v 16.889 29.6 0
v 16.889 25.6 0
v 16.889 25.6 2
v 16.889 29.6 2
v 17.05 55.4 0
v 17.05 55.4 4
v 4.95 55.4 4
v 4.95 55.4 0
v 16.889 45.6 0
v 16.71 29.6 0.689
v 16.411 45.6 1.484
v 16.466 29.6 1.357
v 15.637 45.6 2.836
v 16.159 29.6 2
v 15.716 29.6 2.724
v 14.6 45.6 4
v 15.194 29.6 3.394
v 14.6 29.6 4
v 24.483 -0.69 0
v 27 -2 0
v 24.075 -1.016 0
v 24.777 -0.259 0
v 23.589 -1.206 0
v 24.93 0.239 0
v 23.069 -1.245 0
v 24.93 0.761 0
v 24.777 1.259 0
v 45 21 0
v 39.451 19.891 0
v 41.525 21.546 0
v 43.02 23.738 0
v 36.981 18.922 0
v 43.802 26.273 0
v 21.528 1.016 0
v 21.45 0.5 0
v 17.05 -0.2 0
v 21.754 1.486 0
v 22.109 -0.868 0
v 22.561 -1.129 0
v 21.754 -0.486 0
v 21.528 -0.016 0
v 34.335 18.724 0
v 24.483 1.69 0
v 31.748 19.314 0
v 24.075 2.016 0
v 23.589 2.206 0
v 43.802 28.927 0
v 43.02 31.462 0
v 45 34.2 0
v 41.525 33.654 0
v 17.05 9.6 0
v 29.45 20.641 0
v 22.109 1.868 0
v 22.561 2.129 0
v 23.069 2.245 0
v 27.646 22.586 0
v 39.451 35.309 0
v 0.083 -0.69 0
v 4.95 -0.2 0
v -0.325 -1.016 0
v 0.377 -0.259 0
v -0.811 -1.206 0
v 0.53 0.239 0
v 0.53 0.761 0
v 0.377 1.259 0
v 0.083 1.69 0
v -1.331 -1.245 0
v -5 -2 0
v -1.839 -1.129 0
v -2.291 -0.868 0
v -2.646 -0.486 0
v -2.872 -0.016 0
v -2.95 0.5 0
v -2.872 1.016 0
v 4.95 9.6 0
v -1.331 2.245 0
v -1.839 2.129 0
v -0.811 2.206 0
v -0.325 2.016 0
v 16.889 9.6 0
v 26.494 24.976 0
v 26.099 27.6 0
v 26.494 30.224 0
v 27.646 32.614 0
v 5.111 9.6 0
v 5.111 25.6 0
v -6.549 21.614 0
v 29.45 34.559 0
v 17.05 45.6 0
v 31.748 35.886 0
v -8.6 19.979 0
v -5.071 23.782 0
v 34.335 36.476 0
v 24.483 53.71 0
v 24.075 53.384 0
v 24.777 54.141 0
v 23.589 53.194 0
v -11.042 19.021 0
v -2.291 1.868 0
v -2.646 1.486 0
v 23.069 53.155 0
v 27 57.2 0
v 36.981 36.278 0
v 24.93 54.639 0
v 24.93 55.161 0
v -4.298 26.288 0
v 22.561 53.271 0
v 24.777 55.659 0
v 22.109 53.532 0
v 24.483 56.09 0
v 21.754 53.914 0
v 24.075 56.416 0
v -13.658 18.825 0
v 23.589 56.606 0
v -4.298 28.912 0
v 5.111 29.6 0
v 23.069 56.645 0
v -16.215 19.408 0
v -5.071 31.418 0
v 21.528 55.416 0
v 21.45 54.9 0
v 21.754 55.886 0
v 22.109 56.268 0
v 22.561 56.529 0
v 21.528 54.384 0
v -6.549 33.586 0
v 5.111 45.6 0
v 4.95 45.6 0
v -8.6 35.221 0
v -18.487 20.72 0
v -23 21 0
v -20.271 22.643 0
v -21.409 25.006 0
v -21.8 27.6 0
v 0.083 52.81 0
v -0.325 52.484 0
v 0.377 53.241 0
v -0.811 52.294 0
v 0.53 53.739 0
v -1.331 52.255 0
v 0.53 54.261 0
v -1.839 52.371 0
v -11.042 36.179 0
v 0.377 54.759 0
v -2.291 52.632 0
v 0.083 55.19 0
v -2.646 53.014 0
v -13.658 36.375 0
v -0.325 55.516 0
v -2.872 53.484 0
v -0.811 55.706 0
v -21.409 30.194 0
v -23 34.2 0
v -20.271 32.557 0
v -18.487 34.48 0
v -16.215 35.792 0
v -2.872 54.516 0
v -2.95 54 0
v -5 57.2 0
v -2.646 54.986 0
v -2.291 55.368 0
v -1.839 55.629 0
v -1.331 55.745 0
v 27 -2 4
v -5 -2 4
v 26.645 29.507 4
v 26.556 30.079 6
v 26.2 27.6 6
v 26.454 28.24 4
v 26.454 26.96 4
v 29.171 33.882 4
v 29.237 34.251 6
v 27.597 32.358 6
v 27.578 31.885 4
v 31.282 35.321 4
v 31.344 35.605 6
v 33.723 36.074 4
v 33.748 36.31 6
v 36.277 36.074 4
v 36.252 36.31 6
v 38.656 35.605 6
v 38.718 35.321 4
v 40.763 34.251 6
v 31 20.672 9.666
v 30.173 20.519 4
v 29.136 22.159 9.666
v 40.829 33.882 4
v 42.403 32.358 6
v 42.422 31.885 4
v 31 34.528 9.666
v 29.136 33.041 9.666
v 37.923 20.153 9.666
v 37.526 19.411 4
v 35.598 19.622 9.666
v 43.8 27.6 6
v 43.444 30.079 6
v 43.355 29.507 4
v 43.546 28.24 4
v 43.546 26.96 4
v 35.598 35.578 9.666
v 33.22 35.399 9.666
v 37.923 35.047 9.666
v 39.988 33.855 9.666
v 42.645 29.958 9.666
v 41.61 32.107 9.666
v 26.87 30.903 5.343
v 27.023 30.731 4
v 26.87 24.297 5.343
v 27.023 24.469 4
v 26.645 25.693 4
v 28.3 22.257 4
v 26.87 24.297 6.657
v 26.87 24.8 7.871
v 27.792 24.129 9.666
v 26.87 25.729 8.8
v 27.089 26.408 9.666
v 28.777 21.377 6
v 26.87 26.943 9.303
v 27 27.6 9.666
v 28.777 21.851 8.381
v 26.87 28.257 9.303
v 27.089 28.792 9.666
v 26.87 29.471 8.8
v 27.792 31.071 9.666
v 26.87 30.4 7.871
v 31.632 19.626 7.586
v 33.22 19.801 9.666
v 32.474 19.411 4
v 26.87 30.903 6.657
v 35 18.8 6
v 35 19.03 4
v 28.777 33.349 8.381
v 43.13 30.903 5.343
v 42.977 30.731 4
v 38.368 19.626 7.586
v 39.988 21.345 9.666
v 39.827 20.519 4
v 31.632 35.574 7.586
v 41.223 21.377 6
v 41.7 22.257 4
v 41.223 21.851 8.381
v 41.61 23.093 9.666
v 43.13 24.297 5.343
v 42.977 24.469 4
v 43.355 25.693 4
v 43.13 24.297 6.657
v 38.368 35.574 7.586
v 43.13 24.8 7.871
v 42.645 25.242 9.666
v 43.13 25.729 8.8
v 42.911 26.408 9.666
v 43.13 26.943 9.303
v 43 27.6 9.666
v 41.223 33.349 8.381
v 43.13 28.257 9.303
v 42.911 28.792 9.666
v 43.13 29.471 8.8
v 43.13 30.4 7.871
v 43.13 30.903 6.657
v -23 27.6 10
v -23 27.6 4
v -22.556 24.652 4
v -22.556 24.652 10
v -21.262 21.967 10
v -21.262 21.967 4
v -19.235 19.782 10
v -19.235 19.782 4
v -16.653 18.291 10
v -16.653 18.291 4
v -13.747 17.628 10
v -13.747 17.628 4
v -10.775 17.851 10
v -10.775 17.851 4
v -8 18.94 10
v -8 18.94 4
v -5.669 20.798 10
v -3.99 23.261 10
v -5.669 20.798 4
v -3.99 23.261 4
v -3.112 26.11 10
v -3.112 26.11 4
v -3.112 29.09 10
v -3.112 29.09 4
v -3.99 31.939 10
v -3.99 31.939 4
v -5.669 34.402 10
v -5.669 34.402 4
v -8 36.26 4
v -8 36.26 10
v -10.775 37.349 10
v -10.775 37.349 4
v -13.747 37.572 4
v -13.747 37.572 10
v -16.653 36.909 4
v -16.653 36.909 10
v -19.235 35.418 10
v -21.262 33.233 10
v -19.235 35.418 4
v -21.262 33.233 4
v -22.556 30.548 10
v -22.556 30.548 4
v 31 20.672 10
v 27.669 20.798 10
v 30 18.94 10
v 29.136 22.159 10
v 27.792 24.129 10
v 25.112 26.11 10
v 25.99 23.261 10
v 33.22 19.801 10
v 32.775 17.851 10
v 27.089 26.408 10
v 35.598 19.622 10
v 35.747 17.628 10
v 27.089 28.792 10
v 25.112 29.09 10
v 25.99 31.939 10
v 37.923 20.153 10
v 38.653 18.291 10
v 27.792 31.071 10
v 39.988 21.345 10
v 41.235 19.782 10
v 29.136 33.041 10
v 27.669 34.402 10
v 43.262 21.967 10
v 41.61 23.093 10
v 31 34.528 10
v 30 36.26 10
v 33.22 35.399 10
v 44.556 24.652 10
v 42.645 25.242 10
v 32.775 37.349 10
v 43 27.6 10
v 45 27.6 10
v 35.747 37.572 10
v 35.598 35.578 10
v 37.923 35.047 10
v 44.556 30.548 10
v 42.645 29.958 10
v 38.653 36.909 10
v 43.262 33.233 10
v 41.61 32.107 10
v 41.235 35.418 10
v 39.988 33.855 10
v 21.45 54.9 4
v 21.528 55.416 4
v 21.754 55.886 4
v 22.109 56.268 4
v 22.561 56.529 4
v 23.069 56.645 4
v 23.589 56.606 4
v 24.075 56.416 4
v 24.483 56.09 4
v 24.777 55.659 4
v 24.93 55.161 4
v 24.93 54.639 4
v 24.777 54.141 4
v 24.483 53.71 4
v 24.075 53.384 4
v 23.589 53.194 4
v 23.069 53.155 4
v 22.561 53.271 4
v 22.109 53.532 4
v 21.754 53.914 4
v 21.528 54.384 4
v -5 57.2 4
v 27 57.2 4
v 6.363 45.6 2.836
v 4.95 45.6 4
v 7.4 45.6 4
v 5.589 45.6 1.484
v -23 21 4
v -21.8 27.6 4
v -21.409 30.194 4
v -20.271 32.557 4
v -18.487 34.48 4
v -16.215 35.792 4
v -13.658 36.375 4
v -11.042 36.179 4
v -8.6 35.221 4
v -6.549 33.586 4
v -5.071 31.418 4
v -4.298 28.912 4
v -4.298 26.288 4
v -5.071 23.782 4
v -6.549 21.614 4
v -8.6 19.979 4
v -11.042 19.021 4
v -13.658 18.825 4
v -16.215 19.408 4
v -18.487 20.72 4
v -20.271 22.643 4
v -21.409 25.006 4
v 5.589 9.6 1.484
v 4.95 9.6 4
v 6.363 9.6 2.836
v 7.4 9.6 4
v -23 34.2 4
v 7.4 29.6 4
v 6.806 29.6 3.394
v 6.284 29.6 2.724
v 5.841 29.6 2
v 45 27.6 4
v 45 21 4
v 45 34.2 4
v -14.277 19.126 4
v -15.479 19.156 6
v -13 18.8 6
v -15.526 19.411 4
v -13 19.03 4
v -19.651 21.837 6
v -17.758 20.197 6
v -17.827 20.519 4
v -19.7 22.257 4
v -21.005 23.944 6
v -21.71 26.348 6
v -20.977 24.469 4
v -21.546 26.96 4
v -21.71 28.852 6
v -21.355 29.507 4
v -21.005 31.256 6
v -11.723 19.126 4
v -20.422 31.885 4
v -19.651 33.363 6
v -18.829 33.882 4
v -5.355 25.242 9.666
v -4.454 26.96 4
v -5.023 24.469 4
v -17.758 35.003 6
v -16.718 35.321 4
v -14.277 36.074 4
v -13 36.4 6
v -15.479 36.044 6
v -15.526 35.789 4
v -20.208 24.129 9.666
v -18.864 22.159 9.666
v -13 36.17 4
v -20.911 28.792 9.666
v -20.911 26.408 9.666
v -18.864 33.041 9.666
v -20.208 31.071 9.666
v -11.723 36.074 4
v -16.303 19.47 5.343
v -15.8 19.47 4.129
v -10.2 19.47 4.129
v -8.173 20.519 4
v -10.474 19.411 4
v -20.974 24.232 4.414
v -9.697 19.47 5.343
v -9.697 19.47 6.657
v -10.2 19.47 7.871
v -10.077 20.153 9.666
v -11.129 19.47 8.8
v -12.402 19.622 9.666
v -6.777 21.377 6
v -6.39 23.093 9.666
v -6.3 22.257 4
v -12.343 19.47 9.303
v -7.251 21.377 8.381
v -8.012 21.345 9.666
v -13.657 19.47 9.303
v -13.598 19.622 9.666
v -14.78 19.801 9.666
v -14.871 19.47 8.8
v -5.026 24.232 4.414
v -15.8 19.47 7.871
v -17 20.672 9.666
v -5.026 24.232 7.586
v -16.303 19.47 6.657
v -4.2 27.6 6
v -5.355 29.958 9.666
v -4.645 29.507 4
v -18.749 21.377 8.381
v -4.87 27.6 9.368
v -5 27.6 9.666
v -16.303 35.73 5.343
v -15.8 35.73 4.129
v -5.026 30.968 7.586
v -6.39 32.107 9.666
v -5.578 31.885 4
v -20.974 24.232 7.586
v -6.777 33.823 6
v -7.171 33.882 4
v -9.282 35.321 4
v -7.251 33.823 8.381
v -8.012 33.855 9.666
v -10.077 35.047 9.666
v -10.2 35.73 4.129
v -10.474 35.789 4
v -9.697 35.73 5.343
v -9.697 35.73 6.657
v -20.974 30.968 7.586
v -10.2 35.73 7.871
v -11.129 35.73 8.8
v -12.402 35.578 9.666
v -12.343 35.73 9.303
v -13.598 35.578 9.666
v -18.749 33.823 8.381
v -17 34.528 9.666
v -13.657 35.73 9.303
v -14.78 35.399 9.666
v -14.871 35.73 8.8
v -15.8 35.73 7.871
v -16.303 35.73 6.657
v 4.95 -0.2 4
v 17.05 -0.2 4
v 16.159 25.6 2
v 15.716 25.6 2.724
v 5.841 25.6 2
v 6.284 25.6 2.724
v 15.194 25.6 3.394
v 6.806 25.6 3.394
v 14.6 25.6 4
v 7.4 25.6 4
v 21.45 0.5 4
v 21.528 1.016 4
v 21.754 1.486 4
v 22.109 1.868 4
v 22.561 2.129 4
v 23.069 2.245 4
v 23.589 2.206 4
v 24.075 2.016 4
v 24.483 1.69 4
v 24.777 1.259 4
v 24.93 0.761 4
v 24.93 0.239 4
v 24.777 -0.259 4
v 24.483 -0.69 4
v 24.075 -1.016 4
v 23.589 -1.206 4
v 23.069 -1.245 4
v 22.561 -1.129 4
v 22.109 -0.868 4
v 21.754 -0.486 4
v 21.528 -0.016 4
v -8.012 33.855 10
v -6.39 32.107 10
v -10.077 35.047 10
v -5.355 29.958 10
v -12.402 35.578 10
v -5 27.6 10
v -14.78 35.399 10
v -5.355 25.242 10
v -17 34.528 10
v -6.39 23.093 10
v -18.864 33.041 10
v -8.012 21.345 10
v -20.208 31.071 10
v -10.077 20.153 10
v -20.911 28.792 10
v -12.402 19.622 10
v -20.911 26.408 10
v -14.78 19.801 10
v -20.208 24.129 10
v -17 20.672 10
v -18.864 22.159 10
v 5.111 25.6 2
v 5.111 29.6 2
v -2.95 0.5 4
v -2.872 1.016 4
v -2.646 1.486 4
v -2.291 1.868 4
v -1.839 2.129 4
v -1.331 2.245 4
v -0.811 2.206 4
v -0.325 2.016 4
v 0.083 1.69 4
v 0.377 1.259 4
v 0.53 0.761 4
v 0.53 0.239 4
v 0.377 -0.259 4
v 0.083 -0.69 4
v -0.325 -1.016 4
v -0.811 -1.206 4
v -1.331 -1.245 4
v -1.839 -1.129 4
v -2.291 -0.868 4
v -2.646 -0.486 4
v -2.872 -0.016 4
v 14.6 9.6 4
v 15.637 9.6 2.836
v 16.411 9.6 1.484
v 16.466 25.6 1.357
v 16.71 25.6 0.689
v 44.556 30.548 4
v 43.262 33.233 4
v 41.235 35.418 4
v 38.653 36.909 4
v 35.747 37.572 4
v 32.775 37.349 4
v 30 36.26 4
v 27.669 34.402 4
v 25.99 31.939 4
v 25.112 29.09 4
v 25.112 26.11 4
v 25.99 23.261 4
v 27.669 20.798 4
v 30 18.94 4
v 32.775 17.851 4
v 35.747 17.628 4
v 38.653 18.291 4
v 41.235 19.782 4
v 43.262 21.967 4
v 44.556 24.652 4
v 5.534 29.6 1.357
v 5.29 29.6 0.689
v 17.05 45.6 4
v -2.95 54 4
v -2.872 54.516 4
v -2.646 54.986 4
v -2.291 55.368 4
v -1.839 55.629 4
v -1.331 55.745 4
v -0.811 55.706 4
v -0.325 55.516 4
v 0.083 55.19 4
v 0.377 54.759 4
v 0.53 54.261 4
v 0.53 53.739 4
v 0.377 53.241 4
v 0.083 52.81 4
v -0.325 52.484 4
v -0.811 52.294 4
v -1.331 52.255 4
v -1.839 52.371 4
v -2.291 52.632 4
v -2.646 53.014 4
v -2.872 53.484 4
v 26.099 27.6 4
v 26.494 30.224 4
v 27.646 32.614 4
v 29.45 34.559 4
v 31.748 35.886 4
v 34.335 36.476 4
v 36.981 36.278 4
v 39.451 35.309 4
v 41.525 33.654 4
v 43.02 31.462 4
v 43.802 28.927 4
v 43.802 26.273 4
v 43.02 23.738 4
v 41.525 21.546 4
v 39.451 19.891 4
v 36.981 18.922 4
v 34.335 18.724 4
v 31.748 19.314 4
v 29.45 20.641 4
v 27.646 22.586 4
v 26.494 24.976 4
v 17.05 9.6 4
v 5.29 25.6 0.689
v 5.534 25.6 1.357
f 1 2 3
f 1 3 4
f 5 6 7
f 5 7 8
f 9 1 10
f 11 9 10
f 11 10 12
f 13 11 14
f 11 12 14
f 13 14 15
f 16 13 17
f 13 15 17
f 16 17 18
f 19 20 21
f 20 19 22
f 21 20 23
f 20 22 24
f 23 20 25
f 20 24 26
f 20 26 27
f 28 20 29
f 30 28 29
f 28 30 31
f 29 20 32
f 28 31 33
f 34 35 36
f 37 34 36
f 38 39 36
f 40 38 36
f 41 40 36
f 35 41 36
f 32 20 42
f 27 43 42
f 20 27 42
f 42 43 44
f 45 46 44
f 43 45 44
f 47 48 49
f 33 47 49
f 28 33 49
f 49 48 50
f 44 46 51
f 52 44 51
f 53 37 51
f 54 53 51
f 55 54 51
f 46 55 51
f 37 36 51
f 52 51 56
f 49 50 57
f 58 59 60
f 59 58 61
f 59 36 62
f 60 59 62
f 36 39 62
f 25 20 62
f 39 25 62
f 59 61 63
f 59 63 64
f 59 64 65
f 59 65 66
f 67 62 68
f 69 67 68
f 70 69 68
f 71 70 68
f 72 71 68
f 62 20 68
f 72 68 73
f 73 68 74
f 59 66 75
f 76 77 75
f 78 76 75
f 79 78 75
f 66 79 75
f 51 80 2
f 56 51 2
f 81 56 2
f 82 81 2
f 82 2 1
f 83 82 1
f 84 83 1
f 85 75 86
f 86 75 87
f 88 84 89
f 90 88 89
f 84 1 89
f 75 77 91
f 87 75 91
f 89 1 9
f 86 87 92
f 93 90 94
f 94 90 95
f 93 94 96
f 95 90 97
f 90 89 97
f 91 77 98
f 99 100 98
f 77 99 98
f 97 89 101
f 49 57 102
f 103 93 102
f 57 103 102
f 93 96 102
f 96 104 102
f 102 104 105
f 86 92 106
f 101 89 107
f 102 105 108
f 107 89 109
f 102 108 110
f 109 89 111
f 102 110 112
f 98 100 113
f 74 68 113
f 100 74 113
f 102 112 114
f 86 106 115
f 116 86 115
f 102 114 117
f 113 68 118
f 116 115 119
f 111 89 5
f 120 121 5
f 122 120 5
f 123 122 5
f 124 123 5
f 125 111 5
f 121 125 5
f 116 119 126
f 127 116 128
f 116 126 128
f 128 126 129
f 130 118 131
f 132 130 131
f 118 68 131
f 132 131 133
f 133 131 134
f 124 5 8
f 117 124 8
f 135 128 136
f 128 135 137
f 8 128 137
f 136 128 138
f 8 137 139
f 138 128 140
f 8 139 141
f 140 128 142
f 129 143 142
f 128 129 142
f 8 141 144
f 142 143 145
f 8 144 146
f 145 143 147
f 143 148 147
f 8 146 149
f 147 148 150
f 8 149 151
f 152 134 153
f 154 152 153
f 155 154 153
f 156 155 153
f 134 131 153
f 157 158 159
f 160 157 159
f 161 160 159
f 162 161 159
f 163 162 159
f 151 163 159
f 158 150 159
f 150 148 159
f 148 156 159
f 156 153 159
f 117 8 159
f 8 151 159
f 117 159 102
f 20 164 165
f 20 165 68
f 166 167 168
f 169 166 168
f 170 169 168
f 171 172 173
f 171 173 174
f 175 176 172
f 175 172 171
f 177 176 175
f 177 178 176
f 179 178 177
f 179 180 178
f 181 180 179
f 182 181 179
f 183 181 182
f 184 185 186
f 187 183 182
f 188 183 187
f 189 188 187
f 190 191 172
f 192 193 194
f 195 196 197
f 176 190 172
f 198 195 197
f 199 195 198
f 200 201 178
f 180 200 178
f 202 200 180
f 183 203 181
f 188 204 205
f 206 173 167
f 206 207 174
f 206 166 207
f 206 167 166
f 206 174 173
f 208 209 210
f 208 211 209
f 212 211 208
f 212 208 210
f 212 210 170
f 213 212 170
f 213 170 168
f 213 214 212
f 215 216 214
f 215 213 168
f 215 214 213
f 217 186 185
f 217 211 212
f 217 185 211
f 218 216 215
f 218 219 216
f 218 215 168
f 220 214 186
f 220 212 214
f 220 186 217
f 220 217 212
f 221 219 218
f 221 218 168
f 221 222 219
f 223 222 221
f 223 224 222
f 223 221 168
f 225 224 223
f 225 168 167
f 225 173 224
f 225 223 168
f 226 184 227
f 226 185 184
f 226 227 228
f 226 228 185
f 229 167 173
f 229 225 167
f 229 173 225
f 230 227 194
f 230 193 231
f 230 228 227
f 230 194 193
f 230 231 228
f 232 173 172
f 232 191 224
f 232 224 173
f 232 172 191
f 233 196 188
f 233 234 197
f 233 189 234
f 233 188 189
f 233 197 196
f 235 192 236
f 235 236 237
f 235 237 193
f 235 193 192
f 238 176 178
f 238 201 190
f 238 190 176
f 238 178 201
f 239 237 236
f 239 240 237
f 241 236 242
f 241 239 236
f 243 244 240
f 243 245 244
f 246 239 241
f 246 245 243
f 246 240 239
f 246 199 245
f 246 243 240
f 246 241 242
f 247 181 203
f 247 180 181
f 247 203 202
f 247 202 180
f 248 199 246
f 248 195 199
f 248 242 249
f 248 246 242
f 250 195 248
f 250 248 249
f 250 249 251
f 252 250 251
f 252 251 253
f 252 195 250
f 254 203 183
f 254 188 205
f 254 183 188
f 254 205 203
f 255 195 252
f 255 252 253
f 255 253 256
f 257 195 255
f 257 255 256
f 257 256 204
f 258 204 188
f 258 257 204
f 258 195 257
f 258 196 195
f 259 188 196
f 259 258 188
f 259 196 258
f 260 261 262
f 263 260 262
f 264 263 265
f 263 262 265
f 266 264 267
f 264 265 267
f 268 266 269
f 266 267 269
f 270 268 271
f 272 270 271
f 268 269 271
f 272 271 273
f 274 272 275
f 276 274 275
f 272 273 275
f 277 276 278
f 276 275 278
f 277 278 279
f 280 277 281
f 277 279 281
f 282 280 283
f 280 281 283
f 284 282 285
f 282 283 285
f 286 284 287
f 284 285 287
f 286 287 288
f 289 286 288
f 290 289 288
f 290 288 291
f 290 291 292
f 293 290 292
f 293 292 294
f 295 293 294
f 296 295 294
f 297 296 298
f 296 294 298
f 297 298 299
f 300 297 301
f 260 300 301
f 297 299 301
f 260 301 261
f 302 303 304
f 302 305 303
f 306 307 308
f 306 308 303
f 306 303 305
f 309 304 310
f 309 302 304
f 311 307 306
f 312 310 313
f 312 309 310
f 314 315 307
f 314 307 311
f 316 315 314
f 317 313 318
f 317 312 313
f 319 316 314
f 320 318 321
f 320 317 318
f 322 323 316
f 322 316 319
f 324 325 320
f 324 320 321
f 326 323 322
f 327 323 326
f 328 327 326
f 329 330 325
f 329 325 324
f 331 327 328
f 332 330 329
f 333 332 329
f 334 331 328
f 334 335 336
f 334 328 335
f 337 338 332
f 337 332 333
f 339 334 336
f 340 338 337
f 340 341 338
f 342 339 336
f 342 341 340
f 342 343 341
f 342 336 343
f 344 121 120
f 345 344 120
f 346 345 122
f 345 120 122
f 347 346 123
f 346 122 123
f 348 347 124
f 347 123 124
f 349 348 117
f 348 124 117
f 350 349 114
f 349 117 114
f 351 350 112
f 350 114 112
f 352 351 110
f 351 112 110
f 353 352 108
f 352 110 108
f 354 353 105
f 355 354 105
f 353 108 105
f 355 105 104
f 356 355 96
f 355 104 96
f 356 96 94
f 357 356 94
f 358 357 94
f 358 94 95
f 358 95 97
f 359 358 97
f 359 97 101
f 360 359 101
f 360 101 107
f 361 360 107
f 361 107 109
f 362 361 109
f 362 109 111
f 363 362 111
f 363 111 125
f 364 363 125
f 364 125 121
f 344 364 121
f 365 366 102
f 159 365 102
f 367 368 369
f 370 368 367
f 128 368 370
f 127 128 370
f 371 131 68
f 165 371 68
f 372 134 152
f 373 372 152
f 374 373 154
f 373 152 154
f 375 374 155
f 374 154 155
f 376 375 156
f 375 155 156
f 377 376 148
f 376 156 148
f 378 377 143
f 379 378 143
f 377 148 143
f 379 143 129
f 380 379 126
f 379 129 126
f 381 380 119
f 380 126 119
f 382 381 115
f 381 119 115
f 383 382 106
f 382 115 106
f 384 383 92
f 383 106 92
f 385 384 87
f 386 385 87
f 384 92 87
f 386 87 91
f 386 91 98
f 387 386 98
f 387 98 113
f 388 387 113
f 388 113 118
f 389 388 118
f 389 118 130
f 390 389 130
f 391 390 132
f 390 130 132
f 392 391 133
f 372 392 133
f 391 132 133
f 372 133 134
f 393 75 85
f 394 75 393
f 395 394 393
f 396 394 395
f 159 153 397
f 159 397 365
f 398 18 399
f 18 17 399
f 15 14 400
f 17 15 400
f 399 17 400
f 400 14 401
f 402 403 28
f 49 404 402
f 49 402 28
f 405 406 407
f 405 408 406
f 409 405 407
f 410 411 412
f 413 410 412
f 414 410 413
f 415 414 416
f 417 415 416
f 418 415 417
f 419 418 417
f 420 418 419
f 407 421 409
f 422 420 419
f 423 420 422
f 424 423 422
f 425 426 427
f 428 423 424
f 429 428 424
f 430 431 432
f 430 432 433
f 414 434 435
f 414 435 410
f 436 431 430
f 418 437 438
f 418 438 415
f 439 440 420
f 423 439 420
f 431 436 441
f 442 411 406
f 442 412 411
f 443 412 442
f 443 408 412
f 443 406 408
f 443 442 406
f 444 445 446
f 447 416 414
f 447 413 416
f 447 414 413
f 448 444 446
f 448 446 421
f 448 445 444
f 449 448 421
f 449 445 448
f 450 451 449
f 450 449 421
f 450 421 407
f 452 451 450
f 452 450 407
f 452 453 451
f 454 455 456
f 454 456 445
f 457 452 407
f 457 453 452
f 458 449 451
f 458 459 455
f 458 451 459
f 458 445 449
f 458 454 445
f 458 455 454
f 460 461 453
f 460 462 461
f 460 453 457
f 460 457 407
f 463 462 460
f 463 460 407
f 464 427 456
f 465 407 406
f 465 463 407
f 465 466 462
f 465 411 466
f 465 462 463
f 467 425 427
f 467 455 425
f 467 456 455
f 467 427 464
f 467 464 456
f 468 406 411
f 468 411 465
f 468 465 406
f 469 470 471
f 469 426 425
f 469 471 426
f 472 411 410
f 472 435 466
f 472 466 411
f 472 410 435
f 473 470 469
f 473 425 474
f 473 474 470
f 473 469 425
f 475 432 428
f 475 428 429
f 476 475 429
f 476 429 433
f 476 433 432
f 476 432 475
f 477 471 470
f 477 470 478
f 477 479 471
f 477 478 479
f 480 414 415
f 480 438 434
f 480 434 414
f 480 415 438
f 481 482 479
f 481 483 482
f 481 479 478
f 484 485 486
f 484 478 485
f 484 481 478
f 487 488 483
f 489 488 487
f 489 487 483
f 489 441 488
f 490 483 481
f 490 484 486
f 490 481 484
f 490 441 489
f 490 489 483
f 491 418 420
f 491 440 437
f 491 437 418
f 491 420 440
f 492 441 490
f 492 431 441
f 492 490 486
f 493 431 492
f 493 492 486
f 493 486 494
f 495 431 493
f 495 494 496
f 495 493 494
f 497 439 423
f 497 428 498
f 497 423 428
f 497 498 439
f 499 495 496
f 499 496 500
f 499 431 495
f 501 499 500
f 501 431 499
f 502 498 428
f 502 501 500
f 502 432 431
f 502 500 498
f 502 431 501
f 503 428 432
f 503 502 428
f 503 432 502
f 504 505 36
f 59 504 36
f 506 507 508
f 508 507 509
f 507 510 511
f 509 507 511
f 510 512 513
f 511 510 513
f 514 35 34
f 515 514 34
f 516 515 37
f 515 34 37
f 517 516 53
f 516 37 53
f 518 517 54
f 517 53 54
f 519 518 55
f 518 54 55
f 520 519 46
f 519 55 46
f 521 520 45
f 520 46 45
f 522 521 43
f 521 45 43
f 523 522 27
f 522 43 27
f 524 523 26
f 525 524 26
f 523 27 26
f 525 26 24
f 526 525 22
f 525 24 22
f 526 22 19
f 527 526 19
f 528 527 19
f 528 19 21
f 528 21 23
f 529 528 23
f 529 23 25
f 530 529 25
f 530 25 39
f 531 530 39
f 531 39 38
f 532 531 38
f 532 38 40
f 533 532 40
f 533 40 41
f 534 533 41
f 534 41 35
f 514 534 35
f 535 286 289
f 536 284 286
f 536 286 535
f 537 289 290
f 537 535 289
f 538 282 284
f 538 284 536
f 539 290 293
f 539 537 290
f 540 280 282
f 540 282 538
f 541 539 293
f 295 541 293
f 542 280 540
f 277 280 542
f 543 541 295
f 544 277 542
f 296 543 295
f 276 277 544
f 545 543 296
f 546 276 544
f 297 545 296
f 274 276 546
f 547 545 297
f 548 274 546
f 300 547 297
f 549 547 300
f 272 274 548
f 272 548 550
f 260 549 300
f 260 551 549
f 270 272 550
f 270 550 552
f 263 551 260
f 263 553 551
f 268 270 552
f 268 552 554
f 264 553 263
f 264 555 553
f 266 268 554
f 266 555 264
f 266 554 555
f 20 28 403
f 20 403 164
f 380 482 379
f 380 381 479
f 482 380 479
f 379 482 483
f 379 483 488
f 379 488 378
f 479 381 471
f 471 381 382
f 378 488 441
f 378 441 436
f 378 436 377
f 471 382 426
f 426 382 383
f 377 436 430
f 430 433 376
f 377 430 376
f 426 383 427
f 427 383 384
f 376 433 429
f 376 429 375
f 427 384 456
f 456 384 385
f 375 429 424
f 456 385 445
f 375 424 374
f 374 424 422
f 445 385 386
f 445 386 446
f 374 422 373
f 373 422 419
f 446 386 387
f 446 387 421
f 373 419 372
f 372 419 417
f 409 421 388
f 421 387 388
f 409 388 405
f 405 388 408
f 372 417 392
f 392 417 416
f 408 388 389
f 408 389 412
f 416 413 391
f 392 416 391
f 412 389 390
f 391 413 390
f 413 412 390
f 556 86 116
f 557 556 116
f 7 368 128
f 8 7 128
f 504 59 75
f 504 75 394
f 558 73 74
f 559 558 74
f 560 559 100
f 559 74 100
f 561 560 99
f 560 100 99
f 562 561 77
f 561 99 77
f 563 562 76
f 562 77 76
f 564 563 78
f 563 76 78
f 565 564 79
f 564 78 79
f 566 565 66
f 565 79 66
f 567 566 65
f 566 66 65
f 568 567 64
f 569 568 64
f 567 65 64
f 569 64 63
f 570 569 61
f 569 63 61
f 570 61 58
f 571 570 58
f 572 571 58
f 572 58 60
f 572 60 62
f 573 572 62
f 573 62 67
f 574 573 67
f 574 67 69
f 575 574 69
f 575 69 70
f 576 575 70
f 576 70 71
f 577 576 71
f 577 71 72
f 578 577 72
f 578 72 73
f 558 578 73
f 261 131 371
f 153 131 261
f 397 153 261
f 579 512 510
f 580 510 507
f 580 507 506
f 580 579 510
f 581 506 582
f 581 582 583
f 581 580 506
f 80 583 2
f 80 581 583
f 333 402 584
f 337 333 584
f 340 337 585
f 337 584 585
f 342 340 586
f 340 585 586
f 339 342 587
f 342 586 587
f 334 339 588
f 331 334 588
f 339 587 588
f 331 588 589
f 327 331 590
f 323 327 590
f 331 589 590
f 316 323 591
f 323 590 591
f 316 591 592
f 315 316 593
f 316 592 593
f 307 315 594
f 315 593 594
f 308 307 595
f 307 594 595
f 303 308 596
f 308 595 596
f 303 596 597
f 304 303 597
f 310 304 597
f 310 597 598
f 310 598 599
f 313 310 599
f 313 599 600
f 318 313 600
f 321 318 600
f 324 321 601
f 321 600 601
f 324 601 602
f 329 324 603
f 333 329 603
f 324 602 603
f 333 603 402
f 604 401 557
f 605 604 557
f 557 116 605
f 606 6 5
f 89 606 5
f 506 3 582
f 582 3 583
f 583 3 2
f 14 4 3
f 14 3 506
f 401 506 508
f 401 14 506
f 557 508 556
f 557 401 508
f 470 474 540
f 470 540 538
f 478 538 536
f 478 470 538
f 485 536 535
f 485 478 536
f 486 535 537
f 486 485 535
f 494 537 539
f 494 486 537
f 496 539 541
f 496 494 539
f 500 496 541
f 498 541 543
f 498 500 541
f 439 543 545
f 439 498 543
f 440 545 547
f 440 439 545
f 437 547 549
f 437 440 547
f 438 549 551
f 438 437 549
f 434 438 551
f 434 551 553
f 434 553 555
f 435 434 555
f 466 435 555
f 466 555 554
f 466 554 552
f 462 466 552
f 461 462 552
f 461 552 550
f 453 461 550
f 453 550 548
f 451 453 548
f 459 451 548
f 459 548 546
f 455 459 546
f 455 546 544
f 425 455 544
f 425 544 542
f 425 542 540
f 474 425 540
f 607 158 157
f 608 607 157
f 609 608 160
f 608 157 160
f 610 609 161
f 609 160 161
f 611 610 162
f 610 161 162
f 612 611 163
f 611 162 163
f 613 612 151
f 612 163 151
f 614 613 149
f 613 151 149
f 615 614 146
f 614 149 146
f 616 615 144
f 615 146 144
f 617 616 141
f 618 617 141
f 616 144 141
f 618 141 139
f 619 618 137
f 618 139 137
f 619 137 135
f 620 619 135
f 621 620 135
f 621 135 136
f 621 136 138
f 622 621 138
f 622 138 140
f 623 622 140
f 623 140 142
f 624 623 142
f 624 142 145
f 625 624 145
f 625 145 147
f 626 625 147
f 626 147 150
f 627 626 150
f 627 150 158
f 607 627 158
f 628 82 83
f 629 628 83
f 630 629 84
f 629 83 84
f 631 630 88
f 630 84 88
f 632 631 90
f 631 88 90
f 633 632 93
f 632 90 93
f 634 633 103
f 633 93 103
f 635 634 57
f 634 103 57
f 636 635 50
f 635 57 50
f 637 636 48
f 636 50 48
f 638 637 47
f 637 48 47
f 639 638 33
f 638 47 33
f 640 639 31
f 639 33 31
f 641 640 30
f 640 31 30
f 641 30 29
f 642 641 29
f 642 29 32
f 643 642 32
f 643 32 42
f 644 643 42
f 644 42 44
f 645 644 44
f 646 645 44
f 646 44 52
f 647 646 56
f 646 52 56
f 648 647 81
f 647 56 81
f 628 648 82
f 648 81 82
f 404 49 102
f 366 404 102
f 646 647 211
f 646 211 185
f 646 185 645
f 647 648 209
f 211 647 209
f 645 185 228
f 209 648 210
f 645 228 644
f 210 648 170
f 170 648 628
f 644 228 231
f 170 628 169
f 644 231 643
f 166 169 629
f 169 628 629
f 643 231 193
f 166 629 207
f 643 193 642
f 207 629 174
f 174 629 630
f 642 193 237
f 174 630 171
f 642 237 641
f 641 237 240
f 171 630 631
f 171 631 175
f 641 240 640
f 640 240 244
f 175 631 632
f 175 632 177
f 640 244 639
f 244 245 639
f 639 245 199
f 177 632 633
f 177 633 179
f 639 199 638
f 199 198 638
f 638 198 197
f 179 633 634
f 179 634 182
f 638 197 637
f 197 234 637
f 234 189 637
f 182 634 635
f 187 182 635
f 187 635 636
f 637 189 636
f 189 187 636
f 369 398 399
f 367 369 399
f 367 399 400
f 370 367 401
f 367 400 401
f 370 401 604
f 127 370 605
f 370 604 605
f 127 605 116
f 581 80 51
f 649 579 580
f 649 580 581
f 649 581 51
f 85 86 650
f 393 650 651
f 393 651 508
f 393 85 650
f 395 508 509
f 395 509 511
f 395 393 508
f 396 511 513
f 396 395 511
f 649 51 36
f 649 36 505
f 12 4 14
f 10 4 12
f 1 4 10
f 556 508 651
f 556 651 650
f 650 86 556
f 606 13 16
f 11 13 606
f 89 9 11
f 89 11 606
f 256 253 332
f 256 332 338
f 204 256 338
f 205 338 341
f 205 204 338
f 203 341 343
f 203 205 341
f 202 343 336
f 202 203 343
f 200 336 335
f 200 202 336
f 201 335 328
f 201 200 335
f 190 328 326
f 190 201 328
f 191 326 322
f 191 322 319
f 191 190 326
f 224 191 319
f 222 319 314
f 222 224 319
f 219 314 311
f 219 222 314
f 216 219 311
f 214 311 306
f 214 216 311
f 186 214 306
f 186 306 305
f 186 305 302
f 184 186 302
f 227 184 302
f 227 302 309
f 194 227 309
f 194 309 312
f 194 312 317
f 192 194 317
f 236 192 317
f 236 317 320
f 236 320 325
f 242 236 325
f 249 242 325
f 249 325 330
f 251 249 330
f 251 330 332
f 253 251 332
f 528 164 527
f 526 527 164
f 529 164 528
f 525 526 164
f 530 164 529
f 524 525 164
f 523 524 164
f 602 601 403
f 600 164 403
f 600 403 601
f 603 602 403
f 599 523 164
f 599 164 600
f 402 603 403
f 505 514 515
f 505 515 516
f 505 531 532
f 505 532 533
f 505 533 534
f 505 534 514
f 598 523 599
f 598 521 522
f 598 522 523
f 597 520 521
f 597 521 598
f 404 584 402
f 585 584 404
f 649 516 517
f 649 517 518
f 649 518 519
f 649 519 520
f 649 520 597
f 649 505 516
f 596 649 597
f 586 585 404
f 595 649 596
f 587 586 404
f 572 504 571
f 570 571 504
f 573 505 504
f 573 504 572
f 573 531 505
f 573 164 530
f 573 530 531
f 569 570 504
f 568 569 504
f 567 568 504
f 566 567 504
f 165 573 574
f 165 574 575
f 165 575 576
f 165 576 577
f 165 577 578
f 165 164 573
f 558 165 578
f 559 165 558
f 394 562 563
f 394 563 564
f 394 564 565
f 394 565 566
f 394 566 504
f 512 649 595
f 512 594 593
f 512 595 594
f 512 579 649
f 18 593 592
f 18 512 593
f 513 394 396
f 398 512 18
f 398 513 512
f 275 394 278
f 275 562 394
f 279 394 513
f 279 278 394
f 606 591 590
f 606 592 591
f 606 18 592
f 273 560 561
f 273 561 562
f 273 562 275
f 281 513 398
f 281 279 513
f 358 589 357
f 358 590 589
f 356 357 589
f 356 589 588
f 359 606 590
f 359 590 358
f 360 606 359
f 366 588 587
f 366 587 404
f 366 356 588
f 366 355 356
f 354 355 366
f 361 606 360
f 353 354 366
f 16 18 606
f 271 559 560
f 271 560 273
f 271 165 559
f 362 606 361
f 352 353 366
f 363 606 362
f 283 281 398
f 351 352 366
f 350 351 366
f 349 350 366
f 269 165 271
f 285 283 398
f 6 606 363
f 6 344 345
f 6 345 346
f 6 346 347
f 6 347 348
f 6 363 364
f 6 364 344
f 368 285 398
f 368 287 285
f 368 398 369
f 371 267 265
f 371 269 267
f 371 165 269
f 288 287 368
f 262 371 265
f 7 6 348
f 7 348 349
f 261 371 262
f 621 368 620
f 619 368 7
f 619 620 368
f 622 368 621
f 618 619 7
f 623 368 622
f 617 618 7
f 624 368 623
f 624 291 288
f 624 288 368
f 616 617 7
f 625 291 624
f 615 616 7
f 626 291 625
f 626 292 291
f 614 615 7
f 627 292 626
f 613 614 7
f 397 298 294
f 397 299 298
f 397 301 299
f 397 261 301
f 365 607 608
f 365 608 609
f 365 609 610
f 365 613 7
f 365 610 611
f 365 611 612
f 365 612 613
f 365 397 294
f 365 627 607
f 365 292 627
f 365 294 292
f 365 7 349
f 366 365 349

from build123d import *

# Parameters (mm, degrees)
CROQUIS1_W               = 22
CROQUIS1_H               = 55.2
SALIENTE_EXTRUIR1_DEPTH  = 4
CROQUIS2_W               = 12.1
CROQUIS2_H               = 4
CORTAR_EXTRUIR1_DEPTH    = 9.6
CROQUIS3_W               = 12.1
CROQUIS3_H               = 4
CORTAR_EXTRUIR2_DEPTH    = 9.6
CORTAR_EXTRUIR3_DEPTH    = 16
CORTAR_EXTRUIR4_START    = -16
CORTAR_EXTRUIR4_DEPTH    = 16
CROQUIS9_W               = 11.778481694
CROQUIS9_H               = 4
CORTAR_EXTRUIR5_DEPTH    = 2
CROQUIS11_W              = 4.95
CROQUIS11_H              = 4
SALIENTE_EXTRUIR3_DEPTH  = 2
CROQUIS12_W              = 4
CROQUIS12_H              = 1.8
SALIENTE_EXTRUIR4_DEPTH  = 12.1
CROQUIS13_W              = 4.95
CROQUIS13_H              = 4
SALIENTE_EXTRUIR5_DEPTH  = 2
CROQUIS14_W              = 4
CROQUIS14_H              = 1.8
SALIENTE_EXTRUIR6_DEPTH  = 12.1
CROQUIS17_W              = 4
CROQUIS17_H              = 59.2
SALIENTE_EXTRUIR8_DEPTH  = 23
CROQUIS18_W              = 4
CROQUIS18_H              = 59.2
SALIENTE_EXTRUIR9_DEPTH  = 23
CROQUIS19_R              = 1.75
CORTAR_EXTRUIR6_DEPTH    = 11.5
CROQUIS20_R              = 8.8
CROQUIS20_R_2            = 8.901027098
CORTAR_EXTRUIR7_DEPTH    = 4
CORTAR_EXTRUIR8_DEPTH    = 10
CROQUIS22_R              = 10
CROQUIS22_R_2            = 8
SALIENTE_EXTRUIR10_DEPTH = 6


with BuildPart() as part:
    # Croquis1 → Saliente-Extruir1 (new body)
    with BuildSketch(Plane.XY):
        with Locations((11, 27.6)):
            Rectangle(CROQUIS1_W, CROQUIS1_H)
    extrude(amount=SALIENTE_EXTRUIR1_DEPTH)

    # Croquis2 → Cortar-Extruir1 (cut)
    with BuildSketch(Plane(origin=(0, 55.2, 0), x_dir=(1, 0, 0), z_dir=(0, 1, 0))):
        with Locations((11, -2)):
            Rectangle(CROQUIS2_W, CROQUIS2_H)
    extrude(amount=-CORTAR_EXTRUIR1_DEPTH, mode=Mode.SUBTRACT)

    # Croquis3 → Cortar-Extruir2 (cut)
    with BuildSketch(Plane.XZ):
        with Locations((11, 2)):
            Rectangle(CROQUIS3_W, CROQUIS3_H)
    extrude(amount=-CORTAR_EXTRUIR2_DEPTH, mode=Mode.SUBTRACT)

    # Croquis5 → Cortar-Extruir3 (cut)
    with BuildSketch(Plane.XZ.offset(-9.6)):
        with BuildLine():
            Line((7.4, 4), (14.6, 4))
            ThreePointArc((14.6, 4), (16.401151853, 1.506649462), (17.05, -1.5))
            Line((17.05, -1.5), (4.95, -1.5))
            ThreePointArc((4.95, -1.5), (5.598848147, 1.506649462), (7.4, 4))
        make_face()
    extrude(amount=-CORTAR_EXTRUIR3_DEPTH, mode=Mode.SUBTRACT)

    # Croquis7 → Cortar-Extruir4 (cut)
    with BuildSketch(Plane(origin=(0, 45.6, 0), x_dir=(1, 0, 0), z_dir=(0, 1, 0)).offset(CORTAR_EXTRUIR4_START)):
        with BuildLine():
            Line((4.95, 1.5), (17.05, 1.5))
            ThreePointArc((17.05, 1.5), (16.401151853, -1.506649462), (14.6, -4))
            Line((14.6, -4), (7.4, -4))
            ThreePointArc((7.4, -4), (5.598848147, -1.506649462), (4.95, 1.5))
        make_face()
    extrude(amount=CORTAR_EXTRUIR4_DEPTH, mode=Mode.SUBTRACT)

    # Croquis9 → Cortar-Extruir5 (cut)
    with BuildSketch(Plane(origin=(0, 0, 0), x_dir=(-1, 0, 0), z_dir=(0, 0, -1))):
        with Locations((-11, 27.6)):
            Rectangle(CROQUIS9_W, CROQUIS9_H)
    extrude(amount=-CORTAR_EXTRUIR5_DEPTH, mode=Mode.SUBTRACT)

    # Croquis11 → Saliente-Extruir3 (add)
    with BuildSketch(Plane(origin=(0, 55.2, 0), x_dir=(1, 0, 0), z_dir=(0, 1, 0))):
        with Locations((2.475, -2)):
            Rectangle(CROQUIS11_W, CROQUIS11_H)
        with Locations((19.525, -2)):
            Rectangle(CROQUIS11_W, CROQUIS11_H)
    extrude(amount=SALIENTE_EXTRUIR3_DEPTH)

    # Croquis12 → Saliente-Extruir4 (add)
    with BuildSketch(Plane(origin=(4.95, 0, 0), x_dir=(0, 0, -1), z_dir=(1, 0, 0))):
        with Locations((-2, 56.3)):
            Rectangle(CROQUIS12_W, CROQUIS12_H)
    extrude(amount=SALIENTE_EXTRUIR4_DEPTH)

    # Croquis13 → Saliente-Extruir5 (add)
    with BuildSketch(Plane.XZ):
        with Locations((19.525, 2)):
            Rectangle(CROQUIS13_W, CROQUIS13_H)
        with Locations((2.475, 2)):
            Rectangle(CROQUIS13_W, CROQUIS13_H)
    extrude(amount=SALIENTE_EXTRUIR5_DEPTH)

    # Croquis14 → Saliente-Extruir6 (add)
    with BuildSketch(Plane(origin=(4.95, 0, 0), x_dir=(0, 0, -1), z_dir=(1, 0, 0))):
        with Locations((-2, -1.1)):
            Rectangle(CROQUIS14_W, CROQUIS14_H)
    extrude(amount=SALIENTE_EXTRUIR6_DEPTH)

    # Croquis17 → Saliente-Extruir8 (add)
    with BuildSketch(Plane.ZY):
        with Locations((2, 27.6)):
            Rectangle(CROQUIS17_W, CROQUIS17_H)
    extrude(amount=SALIENTE_EXTRUIR8_DEPTH)

    # Croquis18 → Saliente-Extruir9 (add)
    with BuildSketch(Plane(origin=(22, 0, 0), x_dir=(0, 0, -1), z_dir=(1, 0, 0))):
        with Locations((-2, 27.6)):
            Rectangle(CROQUIS18_W, CROQUIS18_H)
    extrude(amount=SALIENTE_EXTRUIR9_DEPTH)

    # Croquis19 → Cortar-Extruir6 (cut)
    with BuildSketch(Plane(origin=(0, 0, 0), x_dir=(-1, 0, 0), z_dir=(0, 0, -1))):
        with Locations((-23.2, 54.9)):
            Circle(CROQUIS19_R)
        with Locations((1.2, 54)):
            Circle(CROQUIS19_R)
        with Locations((1.2, 0.5)):
            Circle(CROQUIS19_R)
        with Locations((-23.2, 0.5)):
            Circle(CROQUIS19_R)
    extrude(amount=-CORTAR_EXTRUIR6_DEPTH, mode=Mode.SUBTRACT)

    # Croquis20 → Cortar-Extruir7 (cut)
    with BuildSketch(Plane(origin=(0, 0, 0), x_dir=(-1, 0, 0), z_dir=(0, 0, -1))):
        with Locations((13, 27.6)):
            Circle(CROQUIS20_R)
        with Locations((-35, 27.6)):
            Circle(CROQUIS20_R_2)
    extrude(amount=-CORTAR_EXTRUIR7_DEPTH, mode=Mode.SUBTRACT)

    # Croquis21 → Cortar-Extruir8 (cut)
    with BuildSketch(Plane(origin=(0, 0, 0), x_dir=(-1, 0, 0), z_dir=(0, 0, -1))):
        Polygon((-45, 57.2), (-45, 34.2), (-27, 57.2), align=None)
        Polygon((-45, -2), (-45, 21), (-27, -2), align=None)
        Polygon((23, 57.2), (23, 34.2), (5, 57.2), align=None)
        Polygon((23, -2), (23, 21), (5, -2), align=None)
    extrude(amount=-CORTAR_EXTRUIR8_DEPTH, mode=Mode.SUBTRACT)

    # Croquis22 → Saliente-Extruir10 (add)
    # profile 1 of 2: a face of its own
    with BuildSketch(Plane.XY.offset(4)):
        with Locations((35, 27.6)):
            Circle(CROQUIS22_R)
        with Locations((35, 27.6)):
            Circle(CROQUIS22_R_2, mode=Mode.SUBTRACT)
    # profile 2 of 2: a face of its own
    with BuildSketch(Plane.XY.offset(4)):
        with Locations(Location((-13, 27.6, 0), (0, 0, 180))):
            Circle(CROQUIS22_R)
        with Locations((-13, 27.6)):
            Circle(CROQUIS22_R_2, mode=Mode.SUBTRACT)
    extrude(amount=SALIENTE_EXTRUIR10_DEPTH)

    # Croquis23 → Cortar-Revolución1 (revolve, cut)
    with BuildSketch(Plane.XY.offset(6)):
        with BuildLine():
            Line((43.8, 27.6), (26.2, 27.6))
            ThreePointArc((26.2, 27.6), (35, 36.4), (43.8, 27.6))
        make_face()
    revolve(axis=Axis((43.8, 27.6, 6), (-1, 0, 0)), mode=Mode.SUBTRACT)

    # Croquis24 → Cortar-Revolución2 (revolve, cut)
    with BuildSketch(Plane.XY.offset(6)):
        with BuildLine():
            Line((-13, 36.4), (-13, 18.8))
            ThreePointArc((-13, 18.8), (-21.8, 27.6), (-13, 36.4))
        make_face()
    revolve(axis=Axis((-13, 36.4, 6), (0, -1, 0)), mode=Mode.SUBTRACT)


solid = part.part
